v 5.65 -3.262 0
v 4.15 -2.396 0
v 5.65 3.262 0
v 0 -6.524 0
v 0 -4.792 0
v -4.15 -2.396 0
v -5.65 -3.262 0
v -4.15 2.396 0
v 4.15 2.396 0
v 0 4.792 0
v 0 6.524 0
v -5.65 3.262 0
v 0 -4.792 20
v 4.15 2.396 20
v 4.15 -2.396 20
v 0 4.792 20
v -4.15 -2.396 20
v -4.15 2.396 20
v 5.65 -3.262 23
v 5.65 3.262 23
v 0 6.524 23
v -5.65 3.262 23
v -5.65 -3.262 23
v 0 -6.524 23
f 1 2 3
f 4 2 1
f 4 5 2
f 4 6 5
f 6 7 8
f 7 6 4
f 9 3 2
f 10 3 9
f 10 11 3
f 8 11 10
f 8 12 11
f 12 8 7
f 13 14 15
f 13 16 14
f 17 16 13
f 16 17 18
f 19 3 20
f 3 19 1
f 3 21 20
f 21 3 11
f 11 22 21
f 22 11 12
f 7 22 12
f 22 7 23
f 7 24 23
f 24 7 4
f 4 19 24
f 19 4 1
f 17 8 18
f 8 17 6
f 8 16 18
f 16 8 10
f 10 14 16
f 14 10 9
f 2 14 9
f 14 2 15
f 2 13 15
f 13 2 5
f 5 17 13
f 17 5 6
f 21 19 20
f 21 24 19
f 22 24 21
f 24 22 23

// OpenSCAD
// file: config.scad
$fn = $preview ? 32 : 128;
thread_fn = $preview ? 16 : 128;

INFTSML = 0.0000000000001;

BEAM_SPLITTER_WIDTH = 25;
HOLDER_THICKNESS = 5;

BOLT_HEX_WIDTH = 8.3;
BOLT_HEX_LENGTH = 20;
BOLT_MOUNT_THICKNESS = 3;
BOLT_MOUNT_CAP = 3;

module hexagon(width) {
	diagonal = width * tan(30) + (width / 2) / cos(30);
	polygon(points = [
		[0, diagonal / 2],
		[width / 2,  width * tan(30) / 2],
		[width / 2, -width * tan(30) / 2],
		[0, -diagonal / 2],
		[-width / 2, -width * tan(30) / 2],
		[-width / 2,  width * tan(30) / 2],
	]);
}
// main file
include <config.scad>



module stem() {
	linear_extrude(BOLT_HEX_LENGTH) difference() {
		hexagon(BOLT_HEX_WIDTH + BOLT_MOUNT_THICKNESS);
		hexagon(BOLT_HEX_WIDTH);
	}
	translate([0, 0, BOLT_HEX_LENGTH]) linear_extrude(BOLT_MOUNT_CAP) hexagon(BOLT_HEX_WIDTH + BOLT_MOUNT_THICKNESS);
}

stem();
